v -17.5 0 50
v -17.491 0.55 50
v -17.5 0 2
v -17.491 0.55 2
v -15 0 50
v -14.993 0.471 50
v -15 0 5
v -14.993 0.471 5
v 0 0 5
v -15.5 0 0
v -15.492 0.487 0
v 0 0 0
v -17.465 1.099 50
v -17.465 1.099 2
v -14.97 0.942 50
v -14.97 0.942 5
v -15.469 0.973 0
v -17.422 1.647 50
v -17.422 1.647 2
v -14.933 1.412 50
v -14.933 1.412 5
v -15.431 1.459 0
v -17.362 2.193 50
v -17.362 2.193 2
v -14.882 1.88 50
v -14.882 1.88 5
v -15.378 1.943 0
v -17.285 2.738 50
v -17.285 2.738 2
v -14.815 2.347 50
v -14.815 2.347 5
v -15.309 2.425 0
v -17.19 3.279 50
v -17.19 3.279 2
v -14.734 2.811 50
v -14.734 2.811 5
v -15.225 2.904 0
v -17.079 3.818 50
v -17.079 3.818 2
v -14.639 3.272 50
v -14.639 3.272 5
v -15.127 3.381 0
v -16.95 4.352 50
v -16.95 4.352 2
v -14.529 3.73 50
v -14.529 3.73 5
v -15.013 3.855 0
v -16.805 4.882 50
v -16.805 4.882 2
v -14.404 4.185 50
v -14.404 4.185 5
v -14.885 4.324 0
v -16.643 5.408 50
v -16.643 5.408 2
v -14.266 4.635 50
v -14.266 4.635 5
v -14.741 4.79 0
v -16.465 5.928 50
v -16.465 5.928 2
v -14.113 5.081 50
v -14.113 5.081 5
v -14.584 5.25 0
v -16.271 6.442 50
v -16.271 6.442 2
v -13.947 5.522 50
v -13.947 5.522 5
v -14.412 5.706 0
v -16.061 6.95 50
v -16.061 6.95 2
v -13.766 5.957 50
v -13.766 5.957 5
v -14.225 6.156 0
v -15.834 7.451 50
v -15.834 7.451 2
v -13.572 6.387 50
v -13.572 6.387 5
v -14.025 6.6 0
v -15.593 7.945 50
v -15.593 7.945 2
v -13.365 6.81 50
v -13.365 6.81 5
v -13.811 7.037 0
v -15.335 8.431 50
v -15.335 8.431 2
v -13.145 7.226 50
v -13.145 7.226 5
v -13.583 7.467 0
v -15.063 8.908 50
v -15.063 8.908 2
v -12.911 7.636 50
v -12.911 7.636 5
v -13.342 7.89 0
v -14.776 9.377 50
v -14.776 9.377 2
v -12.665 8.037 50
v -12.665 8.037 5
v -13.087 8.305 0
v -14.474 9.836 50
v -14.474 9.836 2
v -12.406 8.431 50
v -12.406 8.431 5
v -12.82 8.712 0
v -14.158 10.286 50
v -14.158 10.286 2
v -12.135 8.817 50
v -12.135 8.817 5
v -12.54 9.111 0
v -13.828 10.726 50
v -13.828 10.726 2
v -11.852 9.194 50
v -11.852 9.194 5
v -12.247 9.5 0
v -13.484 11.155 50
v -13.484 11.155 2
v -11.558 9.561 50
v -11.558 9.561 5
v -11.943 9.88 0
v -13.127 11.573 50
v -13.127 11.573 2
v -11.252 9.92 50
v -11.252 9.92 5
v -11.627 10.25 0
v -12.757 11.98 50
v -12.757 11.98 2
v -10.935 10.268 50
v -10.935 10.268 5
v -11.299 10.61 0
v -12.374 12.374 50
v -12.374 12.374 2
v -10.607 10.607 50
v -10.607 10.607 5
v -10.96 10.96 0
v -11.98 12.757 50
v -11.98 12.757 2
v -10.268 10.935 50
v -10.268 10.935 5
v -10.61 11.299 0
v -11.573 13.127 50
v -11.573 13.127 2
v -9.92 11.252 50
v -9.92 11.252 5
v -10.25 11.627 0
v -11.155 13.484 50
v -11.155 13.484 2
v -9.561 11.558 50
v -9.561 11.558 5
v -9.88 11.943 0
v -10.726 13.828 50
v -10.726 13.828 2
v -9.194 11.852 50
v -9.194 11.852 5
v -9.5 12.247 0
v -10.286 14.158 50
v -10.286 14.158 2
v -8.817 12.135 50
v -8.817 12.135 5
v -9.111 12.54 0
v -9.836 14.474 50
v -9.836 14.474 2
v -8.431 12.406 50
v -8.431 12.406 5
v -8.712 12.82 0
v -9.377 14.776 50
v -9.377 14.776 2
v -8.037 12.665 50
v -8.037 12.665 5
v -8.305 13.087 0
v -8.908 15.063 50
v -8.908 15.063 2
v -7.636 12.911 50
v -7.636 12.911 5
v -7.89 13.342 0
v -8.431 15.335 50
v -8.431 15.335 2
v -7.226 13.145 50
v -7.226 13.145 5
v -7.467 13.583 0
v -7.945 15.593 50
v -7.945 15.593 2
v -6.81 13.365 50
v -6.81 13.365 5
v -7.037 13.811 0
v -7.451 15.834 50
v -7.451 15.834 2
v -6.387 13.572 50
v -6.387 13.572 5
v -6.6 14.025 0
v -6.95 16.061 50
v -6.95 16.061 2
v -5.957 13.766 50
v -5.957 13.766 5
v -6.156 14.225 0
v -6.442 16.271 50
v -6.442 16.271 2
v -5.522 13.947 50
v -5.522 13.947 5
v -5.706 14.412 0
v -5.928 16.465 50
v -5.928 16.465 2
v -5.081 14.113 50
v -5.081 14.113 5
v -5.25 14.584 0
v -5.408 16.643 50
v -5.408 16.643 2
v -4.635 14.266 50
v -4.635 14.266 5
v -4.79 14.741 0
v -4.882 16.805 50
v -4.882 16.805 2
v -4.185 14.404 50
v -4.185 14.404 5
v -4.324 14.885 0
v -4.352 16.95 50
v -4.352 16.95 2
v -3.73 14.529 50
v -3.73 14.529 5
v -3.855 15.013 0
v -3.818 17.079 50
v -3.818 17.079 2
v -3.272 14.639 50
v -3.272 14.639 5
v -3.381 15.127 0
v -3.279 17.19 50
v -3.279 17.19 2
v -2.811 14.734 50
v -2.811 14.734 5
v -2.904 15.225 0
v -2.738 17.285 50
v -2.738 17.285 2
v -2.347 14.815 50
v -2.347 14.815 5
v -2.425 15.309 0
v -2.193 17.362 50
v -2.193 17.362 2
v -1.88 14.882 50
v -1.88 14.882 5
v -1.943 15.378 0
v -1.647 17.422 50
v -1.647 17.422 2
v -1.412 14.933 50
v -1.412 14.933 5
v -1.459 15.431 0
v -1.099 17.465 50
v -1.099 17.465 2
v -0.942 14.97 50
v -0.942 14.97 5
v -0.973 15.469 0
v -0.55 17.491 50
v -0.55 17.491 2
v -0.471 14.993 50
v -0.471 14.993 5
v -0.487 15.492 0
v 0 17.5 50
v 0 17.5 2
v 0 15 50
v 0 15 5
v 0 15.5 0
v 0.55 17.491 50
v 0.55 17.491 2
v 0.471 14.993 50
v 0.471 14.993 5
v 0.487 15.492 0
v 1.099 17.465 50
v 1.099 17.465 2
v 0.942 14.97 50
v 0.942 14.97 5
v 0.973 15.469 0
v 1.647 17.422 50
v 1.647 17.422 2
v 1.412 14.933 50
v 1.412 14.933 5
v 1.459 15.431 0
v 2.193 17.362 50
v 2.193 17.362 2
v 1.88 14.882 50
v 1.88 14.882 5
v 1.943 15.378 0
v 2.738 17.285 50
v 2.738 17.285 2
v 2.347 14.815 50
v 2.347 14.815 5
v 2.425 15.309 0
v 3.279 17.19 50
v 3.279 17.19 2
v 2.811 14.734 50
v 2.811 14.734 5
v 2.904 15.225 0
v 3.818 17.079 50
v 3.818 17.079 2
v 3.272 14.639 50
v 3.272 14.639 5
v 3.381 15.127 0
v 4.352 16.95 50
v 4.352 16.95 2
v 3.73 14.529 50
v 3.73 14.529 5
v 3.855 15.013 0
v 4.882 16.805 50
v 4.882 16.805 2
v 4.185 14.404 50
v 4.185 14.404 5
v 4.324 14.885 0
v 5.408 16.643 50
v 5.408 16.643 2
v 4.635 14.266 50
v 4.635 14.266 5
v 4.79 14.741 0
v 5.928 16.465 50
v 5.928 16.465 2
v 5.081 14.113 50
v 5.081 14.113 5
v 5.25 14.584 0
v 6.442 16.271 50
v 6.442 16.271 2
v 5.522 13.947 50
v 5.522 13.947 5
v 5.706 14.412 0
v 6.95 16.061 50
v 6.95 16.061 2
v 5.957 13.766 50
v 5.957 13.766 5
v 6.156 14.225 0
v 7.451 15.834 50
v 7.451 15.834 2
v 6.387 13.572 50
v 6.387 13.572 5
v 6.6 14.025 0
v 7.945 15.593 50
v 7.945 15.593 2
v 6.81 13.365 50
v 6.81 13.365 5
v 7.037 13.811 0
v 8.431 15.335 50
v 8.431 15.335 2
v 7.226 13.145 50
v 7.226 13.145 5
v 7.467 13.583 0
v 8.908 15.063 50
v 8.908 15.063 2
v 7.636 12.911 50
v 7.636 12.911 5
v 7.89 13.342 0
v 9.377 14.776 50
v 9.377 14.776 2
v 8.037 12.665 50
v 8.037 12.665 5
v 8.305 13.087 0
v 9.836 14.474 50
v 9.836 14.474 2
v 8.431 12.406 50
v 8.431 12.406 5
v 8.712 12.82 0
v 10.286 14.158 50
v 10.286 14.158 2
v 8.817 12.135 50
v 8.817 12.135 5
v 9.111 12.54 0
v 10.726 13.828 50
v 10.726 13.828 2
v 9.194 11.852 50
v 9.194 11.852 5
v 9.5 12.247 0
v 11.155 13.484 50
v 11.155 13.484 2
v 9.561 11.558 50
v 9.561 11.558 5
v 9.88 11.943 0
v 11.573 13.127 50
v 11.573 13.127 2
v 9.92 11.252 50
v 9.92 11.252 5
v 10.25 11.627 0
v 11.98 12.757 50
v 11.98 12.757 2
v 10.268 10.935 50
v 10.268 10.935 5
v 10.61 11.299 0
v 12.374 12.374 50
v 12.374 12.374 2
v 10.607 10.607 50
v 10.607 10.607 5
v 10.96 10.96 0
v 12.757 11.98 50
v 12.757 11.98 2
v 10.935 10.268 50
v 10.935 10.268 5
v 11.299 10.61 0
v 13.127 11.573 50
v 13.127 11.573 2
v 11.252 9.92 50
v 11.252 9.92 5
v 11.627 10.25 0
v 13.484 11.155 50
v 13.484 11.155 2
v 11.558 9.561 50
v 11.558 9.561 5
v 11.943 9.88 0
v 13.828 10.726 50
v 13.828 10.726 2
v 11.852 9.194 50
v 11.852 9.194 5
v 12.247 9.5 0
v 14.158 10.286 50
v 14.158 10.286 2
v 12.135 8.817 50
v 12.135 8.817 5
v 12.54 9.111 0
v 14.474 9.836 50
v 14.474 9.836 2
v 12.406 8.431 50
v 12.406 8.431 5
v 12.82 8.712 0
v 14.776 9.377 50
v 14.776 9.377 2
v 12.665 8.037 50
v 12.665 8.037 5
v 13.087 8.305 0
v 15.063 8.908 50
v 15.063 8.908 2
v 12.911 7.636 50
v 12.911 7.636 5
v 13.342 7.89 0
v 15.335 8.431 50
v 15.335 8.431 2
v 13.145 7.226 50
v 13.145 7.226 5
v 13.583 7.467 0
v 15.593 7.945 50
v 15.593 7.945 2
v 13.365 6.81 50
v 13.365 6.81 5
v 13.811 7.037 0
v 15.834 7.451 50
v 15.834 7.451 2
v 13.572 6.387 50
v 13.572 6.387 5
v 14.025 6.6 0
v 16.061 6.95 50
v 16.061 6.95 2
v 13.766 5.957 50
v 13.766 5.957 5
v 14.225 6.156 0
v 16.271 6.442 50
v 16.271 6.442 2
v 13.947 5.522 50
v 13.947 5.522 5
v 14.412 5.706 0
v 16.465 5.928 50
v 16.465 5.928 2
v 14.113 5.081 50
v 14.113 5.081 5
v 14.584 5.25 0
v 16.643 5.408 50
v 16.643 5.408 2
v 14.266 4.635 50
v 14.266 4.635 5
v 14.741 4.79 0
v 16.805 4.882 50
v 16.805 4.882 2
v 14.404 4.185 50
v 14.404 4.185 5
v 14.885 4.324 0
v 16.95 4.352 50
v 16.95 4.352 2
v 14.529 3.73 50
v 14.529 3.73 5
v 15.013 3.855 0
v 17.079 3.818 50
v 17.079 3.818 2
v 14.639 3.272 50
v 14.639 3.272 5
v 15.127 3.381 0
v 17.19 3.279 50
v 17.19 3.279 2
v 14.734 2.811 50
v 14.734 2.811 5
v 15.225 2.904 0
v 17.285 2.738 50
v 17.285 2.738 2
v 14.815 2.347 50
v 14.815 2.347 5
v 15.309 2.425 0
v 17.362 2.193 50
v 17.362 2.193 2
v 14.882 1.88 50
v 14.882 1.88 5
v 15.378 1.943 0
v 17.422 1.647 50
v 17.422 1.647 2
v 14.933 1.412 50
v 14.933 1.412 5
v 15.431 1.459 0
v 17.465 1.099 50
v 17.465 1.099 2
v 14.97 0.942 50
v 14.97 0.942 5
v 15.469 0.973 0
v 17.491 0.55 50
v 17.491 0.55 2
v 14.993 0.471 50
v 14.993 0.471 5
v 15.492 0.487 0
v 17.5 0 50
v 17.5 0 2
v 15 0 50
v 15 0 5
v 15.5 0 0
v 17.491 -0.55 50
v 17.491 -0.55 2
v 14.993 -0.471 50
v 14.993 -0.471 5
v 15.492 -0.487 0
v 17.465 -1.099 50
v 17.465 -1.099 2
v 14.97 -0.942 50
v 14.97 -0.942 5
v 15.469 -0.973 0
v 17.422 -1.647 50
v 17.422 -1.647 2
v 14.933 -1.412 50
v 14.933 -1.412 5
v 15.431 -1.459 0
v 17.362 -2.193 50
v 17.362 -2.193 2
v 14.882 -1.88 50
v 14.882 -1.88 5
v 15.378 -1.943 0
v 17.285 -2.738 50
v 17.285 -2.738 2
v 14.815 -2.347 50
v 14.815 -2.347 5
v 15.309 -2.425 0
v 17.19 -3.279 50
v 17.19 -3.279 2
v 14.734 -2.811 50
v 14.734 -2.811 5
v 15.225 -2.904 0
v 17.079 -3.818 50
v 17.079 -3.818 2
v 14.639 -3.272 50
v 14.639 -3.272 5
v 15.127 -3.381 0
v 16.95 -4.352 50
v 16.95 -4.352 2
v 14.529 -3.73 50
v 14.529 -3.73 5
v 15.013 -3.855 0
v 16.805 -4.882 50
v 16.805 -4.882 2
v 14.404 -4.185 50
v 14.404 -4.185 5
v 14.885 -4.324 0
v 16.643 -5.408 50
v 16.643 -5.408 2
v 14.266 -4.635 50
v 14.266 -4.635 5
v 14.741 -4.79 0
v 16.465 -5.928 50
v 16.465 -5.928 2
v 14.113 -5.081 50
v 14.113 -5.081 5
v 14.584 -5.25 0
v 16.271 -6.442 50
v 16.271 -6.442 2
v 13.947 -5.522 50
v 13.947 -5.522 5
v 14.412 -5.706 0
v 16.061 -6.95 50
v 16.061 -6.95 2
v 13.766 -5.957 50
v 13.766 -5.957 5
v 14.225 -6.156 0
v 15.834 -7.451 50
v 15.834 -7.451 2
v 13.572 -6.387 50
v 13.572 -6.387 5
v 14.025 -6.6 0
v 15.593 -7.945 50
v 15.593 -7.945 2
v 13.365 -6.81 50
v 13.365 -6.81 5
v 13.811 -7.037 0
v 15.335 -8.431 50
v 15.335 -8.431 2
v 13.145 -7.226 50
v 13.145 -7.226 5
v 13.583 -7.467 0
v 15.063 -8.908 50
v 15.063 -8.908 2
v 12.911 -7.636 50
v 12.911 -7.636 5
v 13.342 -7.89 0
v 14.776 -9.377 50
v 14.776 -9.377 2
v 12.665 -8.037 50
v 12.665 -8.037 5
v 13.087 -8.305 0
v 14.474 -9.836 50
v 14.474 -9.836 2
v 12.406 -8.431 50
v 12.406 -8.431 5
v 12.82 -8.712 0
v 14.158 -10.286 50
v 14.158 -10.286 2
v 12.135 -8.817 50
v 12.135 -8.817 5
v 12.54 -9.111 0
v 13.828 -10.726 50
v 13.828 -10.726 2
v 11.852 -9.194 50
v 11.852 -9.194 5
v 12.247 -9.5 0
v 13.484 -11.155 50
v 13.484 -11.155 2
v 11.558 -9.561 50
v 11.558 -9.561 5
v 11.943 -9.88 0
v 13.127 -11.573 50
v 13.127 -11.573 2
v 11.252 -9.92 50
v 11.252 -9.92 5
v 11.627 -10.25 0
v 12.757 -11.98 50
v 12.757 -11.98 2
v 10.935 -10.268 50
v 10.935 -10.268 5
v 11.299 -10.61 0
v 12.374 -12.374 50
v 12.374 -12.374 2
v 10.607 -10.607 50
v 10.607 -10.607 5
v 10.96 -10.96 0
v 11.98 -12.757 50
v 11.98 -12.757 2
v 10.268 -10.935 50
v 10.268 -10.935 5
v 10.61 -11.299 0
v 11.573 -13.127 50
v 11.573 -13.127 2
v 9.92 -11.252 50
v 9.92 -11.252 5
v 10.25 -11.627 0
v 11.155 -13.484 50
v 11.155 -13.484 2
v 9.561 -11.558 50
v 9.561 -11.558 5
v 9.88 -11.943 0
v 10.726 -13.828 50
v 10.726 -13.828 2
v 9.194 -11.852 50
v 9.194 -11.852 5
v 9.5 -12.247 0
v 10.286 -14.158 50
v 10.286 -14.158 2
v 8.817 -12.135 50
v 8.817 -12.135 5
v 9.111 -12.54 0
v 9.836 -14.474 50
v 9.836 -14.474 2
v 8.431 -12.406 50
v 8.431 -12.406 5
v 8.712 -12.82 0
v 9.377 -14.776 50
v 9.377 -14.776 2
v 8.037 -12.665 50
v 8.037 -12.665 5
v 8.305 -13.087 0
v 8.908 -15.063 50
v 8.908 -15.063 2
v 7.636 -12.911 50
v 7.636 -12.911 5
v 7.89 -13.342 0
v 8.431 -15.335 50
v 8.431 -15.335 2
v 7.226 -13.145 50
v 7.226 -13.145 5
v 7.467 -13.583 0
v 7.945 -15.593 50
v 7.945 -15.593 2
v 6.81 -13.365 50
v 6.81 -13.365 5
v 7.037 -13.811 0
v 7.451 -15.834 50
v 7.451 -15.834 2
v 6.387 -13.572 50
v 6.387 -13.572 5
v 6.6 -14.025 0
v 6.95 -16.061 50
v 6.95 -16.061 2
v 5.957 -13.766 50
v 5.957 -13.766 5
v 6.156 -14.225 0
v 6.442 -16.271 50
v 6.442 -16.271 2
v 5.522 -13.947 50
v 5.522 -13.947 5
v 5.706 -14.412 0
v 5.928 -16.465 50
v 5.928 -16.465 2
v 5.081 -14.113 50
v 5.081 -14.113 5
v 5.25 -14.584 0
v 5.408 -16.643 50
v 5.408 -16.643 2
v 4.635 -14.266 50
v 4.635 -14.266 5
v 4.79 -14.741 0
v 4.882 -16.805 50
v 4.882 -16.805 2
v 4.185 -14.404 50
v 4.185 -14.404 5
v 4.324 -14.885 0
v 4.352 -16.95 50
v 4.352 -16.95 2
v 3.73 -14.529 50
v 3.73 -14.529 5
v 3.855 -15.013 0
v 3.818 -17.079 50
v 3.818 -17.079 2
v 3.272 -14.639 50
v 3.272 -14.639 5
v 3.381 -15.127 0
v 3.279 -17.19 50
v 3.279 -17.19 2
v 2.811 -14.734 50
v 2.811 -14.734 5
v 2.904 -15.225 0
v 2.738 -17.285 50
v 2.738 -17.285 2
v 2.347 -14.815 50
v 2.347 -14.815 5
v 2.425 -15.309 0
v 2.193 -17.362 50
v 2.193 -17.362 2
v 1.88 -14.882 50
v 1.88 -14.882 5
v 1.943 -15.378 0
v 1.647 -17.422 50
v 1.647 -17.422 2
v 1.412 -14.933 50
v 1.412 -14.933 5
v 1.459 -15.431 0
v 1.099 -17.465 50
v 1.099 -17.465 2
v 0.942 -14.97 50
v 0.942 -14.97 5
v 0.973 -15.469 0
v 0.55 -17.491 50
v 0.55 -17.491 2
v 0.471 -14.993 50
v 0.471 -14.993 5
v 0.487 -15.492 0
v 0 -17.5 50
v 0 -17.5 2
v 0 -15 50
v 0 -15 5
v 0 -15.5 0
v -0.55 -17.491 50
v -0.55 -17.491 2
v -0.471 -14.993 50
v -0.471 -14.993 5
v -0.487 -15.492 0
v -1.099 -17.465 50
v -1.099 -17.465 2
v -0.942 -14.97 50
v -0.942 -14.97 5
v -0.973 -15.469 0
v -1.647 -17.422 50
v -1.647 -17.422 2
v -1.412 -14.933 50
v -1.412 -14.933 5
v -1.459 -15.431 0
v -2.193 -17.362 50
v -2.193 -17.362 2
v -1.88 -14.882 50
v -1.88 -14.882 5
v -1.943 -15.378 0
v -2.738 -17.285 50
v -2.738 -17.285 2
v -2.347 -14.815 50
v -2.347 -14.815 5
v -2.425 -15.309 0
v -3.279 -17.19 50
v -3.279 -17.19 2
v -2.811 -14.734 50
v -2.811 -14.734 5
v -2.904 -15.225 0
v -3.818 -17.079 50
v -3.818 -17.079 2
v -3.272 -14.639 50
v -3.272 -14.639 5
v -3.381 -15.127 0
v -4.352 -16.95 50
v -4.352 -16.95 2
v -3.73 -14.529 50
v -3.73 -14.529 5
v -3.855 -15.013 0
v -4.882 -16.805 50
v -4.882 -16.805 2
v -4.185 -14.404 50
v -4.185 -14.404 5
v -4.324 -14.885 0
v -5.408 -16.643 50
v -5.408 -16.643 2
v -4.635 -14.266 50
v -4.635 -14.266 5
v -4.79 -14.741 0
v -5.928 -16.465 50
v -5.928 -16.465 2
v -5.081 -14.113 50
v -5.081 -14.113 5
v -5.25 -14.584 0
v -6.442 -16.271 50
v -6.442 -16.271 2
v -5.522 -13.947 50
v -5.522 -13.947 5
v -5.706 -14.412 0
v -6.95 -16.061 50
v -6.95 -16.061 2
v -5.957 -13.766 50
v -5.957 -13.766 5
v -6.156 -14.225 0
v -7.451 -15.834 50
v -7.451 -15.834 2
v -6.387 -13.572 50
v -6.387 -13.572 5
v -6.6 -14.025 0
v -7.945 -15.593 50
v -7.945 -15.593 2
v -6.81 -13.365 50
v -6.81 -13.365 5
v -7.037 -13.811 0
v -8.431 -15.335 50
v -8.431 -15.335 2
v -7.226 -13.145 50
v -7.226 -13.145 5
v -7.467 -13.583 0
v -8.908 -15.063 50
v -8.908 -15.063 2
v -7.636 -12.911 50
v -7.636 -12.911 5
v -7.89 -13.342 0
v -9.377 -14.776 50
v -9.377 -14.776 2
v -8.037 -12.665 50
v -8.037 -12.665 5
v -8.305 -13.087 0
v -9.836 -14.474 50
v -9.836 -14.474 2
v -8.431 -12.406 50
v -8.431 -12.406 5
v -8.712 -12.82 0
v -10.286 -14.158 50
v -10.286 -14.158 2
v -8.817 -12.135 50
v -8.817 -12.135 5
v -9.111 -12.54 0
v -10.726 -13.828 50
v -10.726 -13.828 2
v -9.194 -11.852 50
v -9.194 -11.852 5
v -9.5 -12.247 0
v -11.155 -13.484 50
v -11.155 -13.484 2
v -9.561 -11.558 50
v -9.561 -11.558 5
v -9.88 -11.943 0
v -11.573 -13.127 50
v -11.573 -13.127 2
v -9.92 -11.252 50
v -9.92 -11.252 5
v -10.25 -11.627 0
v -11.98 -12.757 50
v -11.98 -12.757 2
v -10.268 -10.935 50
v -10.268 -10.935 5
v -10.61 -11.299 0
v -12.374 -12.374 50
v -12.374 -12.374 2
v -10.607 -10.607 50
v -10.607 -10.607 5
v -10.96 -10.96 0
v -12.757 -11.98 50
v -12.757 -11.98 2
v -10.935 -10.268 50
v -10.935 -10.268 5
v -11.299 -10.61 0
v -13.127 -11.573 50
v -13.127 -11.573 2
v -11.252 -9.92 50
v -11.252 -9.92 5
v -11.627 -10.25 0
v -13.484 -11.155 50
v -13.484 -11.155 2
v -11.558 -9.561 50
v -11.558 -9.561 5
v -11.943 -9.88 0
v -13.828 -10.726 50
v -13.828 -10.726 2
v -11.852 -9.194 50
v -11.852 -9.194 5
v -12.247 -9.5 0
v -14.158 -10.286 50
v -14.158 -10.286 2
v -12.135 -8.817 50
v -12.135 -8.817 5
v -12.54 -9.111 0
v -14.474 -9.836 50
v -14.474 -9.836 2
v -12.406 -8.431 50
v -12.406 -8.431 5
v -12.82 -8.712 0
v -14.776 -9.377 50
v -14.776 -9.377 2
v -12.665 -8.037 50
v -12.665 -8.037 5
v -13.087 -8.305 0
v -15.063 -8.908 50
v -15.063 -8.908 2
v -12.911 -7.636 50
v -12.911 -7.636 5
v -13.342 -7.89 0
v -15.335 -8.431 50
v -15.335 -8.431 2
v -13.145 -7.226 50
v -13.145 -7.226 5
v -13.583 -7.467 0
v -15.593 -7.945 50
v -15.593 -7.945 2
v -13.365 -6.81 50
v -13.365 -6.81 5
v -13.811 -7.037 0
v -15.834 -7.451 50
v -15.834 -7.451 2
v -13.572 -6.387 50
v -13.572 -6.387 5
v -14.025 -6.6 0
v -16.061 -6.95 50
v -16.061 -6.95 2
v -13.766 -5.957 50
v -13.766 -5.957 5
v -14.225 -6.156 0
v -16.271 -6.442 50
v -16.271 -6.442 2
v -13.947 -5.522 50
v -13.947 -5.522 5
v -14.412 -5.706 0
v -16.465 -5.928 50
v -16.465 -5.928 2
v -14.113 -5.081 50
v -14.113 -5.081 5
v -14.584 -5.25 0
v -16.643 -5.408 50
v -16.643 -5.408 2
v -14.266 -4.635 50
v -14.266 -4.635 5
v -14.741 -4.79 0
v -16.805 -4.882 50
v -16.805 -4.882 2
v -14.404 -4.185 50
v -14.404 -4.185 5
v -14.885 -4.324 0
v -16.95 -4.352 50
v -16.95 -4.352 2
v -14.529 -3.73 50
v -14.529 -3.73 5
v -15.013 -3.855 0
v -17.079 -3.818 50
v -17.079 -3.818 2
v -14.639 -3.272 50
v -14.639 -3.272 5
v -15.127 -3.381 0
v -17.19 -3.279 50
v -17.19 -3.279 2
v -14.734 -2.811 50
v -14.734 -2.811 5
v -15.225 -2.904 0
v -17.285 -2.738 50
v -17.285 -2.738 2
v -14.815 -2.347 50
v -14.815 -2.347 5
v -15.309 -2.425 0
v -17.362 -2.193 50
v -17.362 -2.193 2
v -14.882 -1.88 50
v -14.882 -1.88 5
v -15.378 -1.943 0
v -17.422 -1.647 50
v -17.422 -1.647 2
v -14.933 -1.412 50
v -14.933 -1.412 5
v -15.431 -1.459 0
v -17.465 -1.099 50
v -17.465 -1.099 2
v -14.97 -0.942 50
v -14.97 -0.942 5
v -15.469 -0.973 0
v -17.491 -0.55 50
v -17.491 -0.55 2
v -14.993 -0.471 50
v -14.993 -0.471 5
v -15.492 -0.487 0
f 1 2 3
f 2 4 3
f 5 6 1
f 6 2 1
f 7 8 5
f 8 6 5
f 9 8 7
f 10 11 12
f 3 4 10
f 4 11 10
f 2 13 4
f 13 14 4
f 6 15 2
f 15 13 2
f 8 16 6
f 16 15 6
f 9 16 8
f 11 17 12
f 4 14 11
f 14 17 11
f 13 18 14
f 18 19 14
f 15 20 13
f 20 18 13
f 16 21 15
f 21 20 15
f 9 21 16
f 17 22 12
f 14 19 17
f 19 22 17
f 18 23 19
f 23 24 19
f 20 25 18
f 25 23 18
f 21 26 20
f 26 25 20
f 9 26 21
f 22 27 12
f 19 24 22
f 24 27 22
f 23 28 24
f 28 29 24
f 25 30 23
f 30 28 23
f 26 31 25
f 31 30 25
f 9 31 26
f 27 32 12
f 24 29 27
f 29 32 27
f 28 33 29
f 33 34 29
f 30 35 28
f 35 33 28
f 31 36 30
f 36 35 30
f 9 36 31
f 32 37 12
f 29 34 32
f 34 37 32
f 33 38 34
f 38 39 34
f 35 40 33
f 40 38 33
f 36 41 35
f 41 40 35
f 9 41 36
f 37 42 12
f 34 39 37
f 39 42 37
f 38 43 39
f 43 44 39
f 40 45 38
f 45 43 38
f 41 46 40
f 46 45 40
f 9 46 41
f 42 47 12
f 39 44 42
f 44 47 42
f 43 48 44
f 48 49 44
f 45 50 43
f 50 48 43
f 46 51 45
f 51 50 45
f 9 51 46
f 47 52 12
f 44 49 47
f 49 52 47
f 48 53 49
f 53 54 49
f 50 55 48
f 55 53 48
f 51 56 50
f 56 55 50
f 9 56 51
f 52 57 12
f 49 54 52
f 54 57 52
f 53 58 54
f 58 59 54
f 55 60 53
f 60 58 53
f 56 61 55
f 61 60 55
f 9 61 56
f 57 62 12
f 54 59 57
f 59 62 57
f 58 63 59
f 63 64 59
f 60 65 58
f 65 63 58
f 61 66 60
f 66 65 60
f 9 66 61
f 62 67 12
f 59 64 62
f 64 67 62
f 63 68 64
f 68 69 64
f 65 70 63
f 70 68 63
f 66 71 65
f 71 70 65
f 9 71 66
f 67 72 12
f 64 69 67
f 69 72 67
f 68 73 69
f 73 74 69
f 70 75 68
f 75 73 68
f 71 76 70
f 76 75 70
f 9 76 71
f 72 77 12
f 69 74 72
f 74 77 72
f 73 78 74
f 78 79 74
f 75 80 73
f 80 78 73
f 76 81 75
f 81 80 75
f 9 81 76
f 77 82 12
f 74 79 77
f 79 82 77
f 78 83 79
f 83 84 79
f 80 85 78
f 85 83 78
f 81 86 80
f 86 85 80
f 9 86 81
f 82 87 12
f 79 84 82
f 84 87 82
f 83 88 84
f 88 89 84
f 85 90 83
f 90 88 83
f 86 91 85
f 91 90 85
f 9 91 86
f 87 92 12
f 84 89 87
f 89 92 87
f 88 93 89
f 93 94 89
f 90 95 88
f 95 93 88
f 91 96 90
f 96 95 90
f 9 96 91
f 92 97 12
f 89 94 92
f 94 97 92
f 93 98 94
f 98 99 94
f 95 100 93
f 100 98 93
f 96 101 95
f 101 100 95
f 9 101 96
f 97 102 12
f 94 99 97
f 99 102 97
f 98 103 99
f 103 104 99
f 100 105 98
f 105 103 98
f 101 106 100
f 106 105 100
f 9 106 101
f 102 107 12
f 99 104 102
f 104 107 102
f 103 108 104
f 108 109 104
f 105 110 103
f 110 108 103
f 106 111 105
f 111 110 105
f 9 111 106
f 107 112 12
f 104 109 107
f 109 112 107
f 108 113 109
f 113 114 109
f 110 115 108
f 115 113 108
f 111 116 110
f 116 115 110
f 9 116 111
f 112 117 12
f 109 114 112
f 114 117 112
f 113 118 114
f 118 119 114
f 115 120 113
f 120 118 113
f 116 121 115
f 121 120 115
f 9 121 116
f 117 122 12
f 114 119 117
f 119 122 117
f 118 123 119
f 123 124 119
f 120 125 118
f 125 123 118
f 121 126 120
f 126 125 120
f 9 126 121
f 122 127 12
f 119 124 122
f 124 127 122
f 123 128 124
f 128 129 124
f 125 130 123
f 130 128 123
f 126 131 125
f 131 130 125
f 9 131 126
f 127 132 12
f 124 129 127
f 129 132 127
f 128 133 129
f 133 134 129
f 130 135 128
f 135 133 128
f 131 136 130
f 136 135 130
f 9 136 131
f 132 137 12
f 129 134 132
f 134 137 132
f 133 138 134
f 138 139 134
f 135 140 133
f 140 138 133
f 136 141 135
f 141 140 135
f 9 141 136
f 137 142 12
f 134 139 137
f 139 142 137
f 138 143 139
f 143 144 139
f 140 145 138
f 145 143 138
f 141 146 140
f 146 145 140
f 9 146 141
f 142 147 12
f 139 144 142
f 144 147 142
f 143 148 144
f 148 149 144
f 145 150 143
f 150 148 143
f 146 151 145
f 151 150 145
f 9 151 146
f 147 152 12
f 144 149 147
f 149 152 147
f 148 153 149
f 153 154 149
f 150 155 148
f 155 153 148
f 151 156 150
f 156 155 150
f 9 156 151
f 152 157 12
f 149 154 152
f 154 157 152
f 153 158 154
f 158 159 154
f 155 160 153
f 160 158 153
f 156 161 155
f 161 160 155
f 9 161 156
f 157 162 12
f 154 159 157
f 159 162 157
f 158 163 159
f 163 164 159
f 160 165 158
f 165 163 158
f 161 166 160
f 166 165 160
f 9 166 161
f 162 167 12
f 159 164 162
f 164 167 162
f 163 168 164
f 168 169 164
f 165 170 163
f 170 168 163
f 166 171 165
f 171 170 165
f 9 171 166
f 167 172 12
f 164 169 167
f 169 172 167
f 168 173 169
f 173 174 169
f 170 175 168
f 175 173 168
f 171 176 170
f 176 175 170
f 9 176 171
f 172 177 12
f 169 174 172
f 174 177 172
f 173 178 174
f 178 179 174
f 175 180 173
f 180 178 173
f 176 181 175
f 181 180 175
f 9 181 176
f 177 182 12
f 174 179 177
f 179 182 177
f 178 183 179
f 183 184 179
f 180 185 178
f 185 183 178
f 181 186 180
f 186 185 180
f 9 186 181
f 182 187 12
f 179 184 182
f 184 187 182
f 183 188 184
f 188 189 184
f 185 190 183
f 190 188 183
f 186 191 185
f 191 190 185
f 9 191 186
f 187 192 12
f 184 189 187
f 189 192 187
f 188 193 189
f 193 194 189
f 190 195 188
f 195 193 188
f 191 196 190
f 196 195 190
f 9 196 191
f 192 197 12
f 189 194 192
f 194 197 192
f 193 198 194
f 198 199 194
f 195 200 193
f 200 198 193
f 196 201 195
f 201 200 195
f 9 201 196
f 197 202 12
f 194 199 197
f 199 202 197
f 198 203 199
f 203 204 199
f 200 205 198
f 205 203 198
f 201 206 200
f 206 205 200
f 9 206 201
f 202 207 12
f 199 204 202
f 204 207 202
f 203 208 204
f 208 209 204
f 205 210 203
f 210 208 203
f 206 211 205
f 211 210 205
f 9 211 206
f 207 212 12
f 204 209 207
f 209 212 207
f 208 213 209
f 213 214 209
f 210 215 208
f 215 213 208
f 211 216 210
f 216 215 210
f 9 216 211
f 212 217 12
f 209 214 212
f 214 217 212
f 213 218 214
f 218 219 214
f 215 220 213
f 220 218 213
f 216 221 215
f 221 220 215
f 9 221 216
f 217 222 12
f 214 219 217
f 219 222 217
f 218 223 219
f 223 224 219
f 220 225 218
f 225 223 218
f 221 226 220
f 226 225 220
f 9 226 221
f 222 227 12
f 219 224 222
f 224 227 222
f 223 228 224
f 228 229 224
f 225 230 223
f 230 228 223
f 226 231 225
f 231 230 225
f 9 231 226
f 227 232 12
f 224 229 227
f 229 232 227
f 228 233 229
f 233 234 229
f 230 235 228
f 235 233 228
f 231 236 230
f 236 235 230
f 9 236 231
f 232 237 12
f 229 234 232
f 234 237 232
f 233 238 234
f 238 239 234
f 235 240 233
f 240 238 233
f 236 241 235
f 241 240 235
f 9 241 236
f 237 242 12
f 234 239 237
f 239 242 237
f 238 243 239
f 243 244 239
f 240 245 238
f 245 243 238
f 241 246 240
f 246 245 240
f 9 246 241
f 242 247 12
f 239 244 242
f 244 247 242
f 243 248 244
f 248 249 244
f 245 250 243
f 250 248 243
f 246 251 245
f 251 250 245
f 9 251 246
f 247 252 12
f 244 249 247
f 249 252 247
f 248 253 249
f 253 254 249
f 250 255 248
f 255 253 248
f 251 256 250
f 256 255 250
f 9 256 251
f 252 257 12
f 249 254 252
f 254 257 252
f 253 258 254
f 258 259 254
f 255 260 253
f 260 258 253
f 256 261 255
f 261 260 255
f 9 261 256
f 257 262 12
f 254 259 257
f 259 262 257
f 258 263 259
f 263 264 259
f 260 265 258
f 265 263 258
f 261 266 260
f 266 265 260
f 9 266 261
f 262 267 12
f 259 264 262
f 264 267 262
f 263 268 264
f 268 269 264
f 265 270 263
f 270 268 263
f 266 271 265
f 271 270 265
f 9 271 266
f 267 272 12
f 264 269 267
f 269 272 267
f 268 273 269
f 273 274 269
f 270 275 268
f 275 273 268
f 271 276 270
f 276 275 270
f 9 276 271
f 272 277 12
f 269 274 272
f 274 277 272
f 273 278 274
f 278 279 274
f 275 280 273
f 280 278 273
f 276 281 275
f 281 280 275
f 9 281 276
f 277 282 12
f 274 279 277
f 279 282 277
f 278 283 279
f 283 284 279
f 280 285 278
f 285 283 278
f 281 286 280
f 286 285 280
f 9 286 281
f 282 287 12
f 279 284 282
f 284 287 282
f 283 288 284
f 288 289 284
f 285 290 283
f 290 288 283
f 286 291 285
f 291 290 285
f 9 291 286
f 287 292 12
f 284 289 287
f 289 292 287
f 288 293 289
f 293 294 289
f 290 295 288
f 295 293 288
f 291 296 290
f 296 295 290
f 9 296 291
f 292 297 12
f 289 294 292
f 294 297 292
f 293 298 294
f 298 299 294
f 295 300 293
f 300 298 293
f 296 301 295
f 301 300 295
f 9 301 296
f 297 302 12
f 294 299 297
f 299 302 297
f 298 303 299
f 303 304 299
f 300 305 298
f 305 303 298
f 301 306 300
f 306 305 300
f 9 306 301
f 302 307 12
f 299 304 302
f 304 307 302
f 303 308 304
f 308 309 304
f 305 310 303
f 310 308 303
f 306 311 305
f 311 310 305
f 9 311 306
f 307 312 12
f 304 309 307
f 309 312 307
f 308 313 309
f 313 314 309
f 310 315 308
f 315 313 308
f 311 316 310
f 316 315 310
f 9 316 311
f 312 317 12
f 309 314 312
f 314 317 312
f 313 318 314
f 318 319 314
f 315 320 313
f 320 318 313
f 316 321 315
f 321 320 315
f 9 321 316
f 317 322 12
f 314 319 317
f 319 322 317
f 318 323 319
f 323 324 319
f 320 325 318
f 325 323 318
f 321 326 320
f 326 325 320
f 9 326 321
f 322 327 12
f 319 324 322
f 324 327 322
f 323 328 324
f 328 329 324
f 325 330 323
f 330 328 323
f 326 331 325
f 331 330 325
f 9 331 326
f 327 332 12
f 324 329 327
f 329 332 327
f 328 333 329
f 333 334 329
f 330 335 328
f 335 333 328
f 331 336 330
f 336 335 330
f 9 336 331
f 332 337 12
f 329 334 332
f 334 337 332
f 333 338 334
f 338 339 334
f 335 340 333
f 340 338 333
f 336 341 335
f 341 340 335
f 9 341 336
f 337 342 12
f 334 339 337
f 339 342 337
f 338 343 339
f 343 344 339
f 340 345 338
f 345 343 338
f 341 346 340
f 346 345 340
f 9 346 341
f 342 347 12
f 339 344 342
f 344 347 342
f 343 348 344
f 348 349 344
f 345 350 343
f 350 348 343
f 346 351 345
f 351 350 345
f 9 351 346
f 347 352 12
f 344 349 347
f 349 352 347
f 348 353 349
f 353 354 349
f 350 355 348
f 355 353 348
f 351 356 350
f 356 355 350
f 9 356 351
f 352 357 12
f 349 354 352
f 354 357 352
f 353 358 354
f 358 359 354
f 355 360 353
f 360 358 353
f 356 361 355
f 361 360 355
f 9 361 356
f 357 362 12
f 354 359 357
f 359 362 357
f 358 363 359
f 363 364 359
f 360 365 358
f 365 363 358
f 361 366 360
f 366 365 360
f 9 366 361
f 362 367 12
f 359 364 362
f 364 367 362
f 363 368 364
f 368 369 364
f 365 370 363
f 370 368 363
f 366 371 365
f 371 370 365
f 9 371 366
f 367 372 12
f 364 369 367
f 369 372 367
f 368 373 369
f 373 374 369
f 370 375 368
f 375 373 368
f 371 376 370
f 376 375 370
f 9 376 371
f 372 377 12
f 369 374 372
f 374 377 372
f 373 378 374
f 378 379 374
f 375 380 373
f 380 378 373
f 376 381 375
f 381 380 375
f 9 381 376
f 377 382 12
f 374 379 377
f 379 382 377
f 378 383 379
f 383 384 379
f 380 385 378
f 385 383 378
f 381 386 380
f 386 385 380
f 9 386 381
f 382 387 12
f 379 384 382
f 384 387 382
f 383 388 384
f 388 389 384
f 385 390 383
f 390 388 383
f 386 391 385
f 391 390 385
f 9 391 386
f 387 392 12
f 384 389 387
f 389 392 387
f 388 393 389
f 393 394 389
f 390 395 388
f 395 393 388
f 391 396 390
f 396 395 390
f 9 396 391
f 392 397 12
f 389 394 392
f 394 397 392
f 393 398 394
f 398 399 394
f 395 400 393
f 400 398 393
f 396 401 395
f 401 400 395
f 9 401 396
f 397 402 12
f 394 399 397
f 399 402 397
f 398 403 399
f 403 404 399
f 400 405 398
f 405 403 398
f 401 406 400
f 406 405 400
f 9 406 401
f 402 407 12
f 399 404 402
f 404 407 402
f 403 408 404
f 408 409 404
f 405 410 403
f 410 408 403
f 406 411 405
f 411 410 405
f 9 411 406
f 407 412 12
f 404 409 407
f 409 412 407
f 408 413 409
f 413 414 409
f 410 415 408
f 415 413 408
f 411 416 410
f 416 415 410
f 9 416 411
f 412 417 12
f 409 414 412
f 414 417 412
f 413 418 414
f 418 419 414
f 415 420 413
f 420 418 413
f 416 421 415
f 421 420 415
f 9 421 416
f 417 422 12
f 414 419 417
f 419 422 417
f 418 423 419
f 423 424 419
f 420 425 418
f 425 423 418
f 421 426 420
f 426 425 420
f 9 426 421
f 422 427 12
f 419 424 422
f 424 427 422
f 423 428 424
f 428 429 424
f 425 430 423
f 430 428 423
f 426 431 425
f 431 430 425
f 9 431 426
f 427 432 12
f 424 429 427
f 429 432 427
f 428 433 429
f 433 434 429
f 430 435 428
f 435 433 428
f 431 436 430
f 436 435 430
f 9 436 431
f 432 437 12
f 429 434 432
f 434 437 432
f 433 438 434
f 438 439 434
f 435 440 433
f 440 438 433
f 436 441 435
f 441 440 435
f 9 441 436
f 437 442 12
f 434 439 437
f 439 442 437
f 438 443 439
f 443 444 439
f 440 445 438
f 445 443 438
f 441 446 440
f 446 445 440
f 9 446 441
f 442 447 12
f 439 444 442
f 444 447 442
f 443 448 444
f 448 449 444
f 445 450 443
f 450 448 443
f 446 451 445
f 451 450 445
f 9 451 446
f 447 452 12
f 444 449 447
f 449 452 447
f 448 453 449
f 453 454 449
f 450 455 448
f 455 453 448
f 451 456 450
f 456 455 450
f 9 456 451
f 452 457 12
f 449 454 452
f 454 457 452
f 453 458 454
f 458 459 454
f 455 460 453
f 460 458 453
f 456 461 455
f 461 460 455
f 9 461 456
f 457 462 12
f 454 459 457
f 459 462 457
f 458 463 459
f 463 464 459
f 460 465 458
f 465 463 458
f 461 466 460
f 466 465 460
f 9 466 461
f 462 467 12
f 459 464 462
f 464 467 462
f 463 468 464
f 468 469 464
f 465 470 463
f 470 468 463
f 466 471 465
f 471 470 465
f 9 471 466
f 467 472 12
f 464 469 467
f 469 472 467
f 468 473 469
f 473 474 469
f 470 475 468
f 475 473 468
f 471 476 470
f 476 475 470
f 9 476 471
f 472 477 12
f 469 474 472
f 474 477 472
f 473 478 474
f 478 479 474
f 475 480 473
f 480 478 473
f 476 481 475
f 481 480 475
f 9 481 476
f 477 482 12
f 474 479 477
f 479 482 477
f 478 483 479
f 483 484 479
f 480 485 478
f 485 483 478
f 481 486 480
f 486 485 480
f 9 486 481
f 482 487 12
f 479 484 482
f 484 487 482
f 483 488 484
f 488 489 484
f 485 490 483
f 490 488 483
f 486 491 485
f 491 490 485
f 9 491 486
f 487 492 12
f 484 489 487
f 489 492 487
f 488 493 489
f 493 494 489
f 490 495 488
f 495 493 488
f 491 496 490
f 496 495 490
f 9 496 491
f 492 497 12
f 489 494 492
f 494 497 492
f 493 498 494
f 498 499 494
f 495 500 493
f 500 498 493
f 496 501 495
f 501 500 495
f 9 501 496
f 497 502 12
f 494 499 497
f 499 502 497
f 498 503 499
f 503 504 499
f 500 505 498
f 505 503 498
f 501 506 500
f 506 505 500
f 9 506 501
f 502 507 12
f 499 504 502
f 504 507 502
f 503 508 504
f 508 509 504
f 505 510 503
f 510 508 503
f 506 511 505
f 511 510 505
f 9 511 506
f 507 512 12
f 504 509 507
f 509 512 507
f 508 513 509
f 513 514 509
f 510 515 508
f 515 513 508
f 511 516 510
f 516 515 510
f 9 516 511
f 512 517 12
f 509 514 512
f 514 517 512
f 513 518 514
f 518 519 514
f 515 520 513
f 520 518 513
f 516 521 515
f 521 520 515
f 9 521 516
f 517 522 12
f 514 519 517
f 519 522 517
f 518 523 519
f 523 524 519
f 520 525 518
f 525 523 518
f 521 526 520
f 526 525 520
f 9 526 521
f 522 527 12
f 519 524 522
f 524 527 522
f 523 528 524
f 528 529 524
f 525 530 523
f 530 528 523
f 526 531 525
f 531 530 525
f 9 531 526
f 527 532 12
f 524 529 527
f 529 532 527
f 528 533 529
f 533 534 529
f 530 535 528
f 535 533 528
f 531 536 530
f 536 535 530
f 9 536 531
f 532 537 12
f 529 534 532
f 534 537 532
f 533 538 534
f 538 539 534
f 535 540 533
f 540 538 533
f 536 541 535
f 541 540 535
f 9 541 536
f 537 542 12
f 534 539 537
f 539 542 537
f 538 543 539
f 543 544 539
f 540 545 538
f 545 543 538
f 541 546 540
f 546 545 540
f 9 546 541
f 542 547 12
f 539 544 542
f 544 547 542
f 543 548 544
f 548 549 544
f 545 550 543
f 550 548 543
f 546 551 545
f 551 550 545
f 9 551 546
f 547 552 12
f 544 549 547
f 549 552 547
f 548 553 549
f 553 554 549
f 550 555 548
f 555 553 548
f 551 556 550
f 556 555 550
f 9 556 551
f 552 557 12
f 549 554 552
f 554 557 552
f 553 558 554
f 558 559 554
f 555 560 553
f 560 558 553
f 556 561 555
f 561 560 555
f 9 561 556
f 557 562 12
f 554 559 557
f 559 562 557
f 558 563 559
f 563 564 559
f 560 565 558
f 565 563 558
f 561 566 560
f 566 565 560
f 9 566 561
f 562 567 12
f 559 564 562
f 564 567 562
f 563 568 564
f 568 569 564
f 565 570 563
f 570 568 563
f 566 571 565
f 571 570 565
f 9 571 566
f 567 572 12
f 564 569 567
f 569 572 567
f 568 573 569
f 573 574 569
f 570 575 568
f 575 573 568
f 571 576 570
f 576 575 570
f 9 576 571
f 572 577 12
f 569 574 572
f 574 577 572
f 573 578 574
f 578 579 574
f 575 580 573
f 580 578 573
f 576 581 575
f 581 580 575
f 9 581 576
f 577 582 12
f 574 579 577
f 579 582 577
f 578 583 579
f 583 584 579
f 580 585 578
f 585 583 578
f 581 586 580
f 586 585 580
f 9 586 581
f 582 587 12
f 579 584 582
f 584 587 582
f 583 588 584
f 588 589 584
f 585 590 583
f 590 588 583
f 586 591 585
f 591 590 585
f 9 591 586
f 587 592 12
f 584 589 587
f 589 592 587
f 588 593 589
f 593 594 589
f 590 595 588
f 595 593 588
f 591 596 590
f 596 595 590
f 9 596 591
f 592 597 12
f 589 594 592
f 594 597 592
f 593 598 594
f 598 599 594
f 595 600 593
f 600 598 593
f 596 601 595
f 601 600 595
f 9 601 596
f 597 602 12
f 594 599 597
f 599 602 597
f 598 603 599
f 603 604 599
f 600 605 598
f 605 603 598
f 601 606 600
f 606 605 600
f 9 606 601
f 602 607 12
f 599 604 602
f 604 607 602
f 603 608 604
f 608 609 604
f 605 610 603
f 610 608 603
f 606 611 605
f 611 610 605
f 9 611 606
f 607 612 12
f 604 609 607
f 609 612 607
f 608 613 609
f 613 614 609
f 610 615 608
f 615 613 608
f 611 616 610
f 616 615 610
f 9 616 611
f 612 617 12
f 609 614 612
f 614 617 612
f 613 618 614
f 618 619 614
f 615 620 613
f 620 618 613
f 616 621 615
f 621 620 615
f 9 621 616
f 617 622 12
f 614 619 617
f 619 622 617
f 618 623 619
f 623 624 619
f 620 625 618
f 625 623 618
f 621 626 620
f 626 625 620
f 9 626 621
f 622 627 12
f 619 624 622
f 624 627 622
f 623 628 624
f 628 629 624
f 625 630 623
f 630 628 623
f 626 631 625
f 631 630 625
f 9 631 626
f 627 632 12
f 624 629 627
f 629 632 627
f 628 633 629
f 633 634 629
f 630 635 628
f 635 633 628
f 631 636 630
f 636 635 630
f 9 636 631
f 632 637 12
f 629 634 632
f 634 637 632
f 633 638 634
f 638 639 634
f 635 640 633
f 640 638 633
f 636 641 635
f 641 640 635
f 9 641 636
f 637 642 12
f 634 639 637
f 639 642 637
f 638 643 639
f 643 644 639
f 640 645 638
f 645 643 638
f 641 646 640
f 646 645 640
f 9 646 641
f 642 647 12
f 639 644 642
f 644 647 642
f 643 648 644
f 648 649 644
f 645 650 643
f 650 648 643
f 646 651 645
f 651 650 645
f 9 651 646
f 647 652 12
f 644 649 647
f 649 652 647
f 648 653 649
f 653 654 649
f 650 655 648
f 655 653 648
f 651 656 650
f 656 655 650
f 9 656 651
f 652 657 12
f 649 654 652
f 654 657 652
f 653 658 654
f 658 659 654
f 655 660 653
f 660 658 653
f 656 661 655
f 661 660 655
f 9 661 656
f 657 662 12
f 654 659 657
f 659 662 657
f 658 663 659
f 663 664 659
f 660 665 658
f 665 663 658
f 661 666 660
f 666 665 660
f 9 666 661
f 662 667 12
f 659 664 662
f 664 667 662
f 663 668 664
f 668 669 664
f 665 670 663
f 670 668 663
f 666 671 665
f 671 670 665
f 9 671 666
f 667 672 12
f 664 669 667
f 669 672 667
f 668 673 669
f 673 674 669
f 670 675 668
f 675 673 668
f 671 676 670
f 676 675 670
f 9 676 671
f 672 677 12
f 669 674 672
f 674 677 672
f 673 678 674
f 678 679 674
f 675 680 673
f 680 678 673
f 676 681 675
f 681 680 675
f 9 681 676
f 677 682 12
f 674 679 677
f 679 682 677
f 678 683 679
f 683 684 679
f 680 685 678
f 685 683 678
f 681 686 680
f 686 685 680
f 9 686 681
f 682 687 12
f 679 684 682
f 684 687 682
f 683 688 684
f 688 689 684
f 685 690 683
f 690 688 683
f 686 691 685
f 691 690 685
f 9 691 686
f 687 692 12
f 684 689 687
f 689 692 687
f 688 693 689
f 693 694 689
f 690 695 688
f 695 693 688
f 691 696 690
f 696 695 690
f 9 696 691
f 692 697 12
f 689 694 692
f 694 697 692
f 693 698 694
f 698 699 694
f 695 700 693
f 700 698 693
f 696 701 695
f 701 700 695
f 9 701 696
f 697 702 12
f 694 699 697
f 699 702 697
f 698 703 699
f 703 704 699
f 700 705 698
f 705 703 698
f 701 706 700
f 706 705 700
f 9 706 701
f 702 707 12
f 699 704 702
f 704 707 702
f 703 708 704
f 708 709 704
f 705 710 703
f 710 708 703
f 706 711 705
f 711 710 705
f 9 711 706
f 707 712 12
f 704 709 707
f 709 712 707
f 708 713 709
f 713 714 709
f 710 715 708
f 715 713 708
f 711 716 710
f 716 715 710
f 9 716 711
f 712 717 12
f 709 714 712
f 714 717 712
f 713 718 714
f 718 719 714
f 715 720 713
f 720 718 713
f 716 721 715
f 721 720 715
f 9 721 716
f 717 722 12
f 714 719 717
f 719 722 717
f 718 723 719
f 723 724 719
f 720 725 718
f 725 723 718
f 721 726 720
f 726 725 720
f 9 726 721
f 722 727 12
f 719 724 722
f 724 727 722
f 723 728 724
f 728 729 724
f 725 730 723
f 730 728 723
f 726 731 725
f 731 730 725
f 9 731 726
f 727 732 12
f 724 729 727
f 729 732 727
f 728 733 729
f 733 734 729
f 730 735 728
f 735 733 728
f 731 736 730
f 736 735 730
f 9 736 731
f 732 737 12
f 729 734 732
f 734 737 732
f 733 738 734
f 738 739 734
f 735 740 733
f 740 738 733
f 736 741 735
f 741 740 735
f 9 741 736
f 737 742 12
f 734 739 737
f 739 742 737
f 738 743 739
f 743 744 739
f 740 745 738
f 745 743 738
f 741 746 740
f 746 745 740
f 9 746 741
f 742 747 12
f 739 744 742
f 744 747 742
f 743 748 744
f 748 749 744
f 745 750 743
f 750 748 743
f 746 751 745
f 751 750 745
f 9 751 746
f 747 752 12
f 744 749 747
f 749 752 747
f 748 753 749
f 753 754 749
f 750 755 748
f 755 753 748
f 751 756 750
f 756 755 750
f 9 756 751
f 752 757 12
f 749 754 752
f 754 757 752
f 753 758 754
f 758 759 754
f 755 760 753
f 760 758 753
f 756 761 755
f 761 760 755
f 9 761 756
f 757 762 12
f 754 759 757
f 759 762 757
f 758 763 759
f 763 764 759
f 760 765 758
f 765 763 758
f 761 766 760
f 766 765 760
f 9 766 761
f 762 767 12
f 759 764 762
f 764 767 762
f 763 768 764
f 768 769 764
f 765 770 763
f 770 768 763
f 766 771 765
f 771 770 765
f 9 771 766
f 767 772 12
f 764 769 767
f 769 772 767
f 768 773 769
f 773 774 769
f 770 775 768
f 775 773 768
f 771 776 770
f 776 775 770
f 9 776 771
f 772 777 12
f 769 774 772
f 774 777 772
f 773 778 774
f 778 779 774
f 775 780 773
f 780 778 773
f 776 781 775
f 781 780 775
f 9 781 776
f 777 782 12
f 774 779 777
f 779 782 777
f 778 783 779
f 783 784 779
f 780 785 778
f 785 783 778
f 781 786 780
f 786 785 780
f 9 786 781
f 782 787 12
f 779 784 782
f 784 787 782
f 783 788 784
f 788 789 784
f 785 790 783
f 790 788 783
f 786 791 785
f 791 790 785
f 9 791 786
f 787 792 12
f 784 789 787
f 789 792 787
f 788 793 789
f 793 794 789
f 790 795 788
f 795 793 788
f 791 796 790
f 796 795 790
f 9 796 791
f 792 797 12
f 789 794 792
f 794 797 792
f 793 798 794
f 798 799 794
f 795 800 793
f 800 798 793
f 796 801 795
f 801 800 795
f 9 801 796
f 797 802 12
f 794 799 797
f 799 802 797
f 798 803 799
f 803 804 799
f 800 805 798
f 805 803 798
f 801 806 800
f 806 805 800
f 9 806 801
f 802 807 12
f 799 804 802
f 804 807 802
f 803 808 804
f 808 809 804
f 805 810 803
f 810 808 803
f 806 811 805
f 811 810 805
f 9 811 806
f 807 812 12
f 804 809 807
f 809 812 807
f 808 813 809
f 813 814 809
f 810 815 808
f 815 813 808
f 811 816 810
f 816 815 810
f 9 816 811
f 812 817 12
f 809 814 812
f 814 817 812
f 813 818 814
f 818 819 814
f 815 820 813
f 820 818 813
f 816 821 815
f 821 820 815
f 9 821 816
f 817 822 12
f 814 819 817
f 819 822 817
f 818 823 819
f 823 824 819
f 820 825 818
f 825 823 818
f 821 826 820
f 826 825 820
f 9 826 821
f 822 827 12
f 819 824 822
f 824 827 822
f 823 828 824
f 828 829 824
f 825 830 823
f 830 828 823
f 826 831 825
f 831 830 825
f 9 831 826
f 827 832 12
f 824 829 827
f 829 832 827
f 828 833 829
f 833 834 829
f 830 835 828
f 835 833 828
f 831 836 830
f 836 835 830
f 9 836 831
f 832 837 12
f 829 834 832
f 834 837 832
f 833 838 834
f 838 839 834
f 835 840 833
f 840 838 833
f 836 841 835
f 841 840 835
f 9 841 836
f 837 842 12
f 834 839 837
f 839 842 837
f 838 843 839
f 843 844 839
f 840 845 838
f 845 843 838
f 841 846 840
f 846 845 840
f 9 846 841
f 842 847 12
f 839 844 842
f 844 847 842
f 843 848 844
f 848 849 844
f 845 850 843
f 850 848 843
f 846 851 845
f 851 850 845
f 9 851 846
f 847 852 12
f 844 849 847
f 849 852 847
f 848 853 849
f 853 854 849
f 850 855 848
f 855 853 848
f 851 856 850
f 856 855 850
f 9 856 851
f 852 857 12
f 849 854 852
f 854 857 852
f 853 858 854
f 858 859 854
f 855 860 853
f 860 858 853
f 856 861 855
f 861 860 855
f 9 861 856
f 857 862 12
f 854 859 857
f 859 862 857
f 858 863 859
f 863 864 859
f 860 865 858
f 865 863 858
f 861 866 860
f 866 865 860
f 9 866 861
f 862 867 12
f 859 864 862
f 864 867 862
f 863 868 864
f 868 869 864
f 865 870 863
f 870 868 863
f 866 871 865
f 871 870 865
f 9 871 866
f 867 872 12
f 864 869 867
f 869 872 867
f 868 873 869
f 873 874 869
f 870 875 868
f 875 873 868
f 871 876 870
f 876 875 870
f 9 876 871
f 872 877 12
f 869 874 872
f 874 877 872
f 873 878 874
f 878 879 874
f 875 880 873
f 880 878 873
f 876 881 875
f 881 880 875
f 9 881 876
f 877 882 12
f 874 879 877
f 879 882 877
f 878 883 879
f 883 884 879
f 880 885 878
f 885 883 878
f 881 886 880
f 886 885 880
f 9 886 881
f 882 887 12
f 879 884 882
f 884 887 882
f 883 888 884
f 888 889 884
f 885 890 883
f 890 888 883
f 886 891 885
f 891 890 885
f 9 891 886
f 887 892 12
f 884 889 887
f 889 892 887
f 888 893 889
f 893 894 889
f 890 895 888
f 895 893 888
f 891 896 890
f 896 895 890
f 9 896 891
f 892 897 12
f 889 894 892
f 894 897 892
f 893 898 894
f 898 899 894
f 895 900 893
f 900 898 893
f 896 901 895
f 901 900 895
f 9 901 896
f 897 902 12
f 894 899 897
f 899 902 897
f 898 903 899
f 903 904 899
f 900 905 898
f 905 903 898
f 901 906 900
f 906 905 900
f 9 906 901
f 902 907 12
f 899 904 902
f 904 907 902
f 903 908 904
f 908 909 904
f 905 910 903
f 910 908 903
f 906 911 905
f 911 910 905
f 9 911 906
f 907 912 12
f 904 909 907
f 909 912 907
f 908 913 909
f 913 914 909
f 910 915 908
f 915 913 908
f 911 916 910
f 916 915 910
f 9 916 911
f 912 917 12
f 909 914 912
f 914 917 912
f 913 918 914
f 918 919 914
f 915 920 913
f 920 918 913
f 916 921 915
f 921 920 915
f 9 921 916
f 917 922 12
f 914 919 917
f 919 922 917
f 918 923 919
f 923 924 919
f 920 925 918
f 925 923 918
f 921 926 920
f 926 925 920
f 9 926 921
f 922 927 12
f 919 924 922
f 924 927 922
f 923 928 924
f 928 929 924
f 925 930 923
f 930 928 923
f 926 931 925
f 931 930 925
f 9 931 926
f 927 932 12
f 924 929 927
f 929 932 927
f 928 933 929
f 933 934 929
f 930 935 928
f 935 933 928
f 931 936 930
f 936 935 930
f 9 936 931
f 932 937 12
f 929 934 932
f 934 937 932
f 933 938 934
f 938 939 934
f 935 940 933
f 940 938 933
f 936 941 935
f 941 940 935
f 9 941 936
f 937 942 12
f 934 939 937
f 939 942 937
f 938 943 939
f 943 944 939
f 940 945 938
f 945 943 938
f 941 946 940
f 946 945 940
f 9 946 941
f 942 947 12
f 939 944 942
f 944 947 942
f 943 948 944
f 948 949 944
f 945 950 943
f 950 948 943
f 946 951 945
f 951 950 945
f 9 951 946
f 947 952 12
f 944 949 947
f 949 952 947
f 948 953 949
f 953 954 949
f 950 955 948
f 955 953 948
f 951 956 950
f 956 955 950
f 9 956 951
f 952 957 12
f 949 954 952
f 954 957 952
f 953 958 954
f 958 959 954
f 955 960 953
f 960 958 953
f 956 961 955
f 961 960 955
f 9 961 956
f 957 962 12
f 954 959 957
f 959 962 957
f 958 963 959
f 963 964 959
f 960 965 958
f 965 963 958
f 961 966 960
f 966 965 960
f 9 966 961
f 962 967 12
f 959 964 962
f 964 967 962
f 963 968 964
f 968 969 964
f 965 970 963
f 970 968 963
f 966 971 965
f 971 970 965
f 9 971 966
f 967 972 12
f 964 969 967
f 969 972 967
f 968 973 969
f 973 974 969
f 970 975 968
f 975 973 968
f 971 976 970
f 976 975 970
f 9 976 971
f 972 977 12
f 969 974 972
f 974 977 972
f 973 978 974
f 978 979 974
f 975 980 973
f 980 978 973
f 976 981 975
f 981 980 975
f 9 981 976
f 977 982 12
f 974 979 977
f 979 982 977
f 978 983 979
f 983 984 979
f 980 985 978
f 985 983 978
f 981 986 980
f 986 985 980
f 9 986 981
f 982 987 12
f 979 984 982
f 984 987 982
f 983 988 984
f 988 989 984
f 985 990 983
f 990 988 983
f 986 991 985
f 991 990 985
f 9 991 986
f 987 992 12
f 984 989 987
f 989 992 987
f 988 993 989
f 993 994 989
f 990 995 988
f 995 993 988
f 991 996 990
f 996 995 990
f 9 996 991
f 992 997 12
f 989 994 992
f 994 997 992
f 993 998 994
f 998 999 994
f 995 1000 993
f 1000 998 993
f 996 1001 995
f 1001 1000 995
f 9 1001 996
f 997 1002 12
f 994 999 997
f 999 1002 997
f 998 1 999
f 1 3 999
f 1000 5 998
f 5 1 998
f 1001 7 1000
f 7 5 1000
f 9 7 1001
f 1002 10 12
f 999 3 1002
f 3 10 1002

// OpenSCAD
// pipe cover for work
// v01
// 02.08.2026 Sebastian Weigl

// set the fregment sizes
$fn = $preview ? 48 : 64;

#rotate_extrude($fn=200)
polygon(
  points=[[0,0],[15.5,0],[17.5,2],[17.5,50],[15,50],[15,5],[0,5]]
  )
;
